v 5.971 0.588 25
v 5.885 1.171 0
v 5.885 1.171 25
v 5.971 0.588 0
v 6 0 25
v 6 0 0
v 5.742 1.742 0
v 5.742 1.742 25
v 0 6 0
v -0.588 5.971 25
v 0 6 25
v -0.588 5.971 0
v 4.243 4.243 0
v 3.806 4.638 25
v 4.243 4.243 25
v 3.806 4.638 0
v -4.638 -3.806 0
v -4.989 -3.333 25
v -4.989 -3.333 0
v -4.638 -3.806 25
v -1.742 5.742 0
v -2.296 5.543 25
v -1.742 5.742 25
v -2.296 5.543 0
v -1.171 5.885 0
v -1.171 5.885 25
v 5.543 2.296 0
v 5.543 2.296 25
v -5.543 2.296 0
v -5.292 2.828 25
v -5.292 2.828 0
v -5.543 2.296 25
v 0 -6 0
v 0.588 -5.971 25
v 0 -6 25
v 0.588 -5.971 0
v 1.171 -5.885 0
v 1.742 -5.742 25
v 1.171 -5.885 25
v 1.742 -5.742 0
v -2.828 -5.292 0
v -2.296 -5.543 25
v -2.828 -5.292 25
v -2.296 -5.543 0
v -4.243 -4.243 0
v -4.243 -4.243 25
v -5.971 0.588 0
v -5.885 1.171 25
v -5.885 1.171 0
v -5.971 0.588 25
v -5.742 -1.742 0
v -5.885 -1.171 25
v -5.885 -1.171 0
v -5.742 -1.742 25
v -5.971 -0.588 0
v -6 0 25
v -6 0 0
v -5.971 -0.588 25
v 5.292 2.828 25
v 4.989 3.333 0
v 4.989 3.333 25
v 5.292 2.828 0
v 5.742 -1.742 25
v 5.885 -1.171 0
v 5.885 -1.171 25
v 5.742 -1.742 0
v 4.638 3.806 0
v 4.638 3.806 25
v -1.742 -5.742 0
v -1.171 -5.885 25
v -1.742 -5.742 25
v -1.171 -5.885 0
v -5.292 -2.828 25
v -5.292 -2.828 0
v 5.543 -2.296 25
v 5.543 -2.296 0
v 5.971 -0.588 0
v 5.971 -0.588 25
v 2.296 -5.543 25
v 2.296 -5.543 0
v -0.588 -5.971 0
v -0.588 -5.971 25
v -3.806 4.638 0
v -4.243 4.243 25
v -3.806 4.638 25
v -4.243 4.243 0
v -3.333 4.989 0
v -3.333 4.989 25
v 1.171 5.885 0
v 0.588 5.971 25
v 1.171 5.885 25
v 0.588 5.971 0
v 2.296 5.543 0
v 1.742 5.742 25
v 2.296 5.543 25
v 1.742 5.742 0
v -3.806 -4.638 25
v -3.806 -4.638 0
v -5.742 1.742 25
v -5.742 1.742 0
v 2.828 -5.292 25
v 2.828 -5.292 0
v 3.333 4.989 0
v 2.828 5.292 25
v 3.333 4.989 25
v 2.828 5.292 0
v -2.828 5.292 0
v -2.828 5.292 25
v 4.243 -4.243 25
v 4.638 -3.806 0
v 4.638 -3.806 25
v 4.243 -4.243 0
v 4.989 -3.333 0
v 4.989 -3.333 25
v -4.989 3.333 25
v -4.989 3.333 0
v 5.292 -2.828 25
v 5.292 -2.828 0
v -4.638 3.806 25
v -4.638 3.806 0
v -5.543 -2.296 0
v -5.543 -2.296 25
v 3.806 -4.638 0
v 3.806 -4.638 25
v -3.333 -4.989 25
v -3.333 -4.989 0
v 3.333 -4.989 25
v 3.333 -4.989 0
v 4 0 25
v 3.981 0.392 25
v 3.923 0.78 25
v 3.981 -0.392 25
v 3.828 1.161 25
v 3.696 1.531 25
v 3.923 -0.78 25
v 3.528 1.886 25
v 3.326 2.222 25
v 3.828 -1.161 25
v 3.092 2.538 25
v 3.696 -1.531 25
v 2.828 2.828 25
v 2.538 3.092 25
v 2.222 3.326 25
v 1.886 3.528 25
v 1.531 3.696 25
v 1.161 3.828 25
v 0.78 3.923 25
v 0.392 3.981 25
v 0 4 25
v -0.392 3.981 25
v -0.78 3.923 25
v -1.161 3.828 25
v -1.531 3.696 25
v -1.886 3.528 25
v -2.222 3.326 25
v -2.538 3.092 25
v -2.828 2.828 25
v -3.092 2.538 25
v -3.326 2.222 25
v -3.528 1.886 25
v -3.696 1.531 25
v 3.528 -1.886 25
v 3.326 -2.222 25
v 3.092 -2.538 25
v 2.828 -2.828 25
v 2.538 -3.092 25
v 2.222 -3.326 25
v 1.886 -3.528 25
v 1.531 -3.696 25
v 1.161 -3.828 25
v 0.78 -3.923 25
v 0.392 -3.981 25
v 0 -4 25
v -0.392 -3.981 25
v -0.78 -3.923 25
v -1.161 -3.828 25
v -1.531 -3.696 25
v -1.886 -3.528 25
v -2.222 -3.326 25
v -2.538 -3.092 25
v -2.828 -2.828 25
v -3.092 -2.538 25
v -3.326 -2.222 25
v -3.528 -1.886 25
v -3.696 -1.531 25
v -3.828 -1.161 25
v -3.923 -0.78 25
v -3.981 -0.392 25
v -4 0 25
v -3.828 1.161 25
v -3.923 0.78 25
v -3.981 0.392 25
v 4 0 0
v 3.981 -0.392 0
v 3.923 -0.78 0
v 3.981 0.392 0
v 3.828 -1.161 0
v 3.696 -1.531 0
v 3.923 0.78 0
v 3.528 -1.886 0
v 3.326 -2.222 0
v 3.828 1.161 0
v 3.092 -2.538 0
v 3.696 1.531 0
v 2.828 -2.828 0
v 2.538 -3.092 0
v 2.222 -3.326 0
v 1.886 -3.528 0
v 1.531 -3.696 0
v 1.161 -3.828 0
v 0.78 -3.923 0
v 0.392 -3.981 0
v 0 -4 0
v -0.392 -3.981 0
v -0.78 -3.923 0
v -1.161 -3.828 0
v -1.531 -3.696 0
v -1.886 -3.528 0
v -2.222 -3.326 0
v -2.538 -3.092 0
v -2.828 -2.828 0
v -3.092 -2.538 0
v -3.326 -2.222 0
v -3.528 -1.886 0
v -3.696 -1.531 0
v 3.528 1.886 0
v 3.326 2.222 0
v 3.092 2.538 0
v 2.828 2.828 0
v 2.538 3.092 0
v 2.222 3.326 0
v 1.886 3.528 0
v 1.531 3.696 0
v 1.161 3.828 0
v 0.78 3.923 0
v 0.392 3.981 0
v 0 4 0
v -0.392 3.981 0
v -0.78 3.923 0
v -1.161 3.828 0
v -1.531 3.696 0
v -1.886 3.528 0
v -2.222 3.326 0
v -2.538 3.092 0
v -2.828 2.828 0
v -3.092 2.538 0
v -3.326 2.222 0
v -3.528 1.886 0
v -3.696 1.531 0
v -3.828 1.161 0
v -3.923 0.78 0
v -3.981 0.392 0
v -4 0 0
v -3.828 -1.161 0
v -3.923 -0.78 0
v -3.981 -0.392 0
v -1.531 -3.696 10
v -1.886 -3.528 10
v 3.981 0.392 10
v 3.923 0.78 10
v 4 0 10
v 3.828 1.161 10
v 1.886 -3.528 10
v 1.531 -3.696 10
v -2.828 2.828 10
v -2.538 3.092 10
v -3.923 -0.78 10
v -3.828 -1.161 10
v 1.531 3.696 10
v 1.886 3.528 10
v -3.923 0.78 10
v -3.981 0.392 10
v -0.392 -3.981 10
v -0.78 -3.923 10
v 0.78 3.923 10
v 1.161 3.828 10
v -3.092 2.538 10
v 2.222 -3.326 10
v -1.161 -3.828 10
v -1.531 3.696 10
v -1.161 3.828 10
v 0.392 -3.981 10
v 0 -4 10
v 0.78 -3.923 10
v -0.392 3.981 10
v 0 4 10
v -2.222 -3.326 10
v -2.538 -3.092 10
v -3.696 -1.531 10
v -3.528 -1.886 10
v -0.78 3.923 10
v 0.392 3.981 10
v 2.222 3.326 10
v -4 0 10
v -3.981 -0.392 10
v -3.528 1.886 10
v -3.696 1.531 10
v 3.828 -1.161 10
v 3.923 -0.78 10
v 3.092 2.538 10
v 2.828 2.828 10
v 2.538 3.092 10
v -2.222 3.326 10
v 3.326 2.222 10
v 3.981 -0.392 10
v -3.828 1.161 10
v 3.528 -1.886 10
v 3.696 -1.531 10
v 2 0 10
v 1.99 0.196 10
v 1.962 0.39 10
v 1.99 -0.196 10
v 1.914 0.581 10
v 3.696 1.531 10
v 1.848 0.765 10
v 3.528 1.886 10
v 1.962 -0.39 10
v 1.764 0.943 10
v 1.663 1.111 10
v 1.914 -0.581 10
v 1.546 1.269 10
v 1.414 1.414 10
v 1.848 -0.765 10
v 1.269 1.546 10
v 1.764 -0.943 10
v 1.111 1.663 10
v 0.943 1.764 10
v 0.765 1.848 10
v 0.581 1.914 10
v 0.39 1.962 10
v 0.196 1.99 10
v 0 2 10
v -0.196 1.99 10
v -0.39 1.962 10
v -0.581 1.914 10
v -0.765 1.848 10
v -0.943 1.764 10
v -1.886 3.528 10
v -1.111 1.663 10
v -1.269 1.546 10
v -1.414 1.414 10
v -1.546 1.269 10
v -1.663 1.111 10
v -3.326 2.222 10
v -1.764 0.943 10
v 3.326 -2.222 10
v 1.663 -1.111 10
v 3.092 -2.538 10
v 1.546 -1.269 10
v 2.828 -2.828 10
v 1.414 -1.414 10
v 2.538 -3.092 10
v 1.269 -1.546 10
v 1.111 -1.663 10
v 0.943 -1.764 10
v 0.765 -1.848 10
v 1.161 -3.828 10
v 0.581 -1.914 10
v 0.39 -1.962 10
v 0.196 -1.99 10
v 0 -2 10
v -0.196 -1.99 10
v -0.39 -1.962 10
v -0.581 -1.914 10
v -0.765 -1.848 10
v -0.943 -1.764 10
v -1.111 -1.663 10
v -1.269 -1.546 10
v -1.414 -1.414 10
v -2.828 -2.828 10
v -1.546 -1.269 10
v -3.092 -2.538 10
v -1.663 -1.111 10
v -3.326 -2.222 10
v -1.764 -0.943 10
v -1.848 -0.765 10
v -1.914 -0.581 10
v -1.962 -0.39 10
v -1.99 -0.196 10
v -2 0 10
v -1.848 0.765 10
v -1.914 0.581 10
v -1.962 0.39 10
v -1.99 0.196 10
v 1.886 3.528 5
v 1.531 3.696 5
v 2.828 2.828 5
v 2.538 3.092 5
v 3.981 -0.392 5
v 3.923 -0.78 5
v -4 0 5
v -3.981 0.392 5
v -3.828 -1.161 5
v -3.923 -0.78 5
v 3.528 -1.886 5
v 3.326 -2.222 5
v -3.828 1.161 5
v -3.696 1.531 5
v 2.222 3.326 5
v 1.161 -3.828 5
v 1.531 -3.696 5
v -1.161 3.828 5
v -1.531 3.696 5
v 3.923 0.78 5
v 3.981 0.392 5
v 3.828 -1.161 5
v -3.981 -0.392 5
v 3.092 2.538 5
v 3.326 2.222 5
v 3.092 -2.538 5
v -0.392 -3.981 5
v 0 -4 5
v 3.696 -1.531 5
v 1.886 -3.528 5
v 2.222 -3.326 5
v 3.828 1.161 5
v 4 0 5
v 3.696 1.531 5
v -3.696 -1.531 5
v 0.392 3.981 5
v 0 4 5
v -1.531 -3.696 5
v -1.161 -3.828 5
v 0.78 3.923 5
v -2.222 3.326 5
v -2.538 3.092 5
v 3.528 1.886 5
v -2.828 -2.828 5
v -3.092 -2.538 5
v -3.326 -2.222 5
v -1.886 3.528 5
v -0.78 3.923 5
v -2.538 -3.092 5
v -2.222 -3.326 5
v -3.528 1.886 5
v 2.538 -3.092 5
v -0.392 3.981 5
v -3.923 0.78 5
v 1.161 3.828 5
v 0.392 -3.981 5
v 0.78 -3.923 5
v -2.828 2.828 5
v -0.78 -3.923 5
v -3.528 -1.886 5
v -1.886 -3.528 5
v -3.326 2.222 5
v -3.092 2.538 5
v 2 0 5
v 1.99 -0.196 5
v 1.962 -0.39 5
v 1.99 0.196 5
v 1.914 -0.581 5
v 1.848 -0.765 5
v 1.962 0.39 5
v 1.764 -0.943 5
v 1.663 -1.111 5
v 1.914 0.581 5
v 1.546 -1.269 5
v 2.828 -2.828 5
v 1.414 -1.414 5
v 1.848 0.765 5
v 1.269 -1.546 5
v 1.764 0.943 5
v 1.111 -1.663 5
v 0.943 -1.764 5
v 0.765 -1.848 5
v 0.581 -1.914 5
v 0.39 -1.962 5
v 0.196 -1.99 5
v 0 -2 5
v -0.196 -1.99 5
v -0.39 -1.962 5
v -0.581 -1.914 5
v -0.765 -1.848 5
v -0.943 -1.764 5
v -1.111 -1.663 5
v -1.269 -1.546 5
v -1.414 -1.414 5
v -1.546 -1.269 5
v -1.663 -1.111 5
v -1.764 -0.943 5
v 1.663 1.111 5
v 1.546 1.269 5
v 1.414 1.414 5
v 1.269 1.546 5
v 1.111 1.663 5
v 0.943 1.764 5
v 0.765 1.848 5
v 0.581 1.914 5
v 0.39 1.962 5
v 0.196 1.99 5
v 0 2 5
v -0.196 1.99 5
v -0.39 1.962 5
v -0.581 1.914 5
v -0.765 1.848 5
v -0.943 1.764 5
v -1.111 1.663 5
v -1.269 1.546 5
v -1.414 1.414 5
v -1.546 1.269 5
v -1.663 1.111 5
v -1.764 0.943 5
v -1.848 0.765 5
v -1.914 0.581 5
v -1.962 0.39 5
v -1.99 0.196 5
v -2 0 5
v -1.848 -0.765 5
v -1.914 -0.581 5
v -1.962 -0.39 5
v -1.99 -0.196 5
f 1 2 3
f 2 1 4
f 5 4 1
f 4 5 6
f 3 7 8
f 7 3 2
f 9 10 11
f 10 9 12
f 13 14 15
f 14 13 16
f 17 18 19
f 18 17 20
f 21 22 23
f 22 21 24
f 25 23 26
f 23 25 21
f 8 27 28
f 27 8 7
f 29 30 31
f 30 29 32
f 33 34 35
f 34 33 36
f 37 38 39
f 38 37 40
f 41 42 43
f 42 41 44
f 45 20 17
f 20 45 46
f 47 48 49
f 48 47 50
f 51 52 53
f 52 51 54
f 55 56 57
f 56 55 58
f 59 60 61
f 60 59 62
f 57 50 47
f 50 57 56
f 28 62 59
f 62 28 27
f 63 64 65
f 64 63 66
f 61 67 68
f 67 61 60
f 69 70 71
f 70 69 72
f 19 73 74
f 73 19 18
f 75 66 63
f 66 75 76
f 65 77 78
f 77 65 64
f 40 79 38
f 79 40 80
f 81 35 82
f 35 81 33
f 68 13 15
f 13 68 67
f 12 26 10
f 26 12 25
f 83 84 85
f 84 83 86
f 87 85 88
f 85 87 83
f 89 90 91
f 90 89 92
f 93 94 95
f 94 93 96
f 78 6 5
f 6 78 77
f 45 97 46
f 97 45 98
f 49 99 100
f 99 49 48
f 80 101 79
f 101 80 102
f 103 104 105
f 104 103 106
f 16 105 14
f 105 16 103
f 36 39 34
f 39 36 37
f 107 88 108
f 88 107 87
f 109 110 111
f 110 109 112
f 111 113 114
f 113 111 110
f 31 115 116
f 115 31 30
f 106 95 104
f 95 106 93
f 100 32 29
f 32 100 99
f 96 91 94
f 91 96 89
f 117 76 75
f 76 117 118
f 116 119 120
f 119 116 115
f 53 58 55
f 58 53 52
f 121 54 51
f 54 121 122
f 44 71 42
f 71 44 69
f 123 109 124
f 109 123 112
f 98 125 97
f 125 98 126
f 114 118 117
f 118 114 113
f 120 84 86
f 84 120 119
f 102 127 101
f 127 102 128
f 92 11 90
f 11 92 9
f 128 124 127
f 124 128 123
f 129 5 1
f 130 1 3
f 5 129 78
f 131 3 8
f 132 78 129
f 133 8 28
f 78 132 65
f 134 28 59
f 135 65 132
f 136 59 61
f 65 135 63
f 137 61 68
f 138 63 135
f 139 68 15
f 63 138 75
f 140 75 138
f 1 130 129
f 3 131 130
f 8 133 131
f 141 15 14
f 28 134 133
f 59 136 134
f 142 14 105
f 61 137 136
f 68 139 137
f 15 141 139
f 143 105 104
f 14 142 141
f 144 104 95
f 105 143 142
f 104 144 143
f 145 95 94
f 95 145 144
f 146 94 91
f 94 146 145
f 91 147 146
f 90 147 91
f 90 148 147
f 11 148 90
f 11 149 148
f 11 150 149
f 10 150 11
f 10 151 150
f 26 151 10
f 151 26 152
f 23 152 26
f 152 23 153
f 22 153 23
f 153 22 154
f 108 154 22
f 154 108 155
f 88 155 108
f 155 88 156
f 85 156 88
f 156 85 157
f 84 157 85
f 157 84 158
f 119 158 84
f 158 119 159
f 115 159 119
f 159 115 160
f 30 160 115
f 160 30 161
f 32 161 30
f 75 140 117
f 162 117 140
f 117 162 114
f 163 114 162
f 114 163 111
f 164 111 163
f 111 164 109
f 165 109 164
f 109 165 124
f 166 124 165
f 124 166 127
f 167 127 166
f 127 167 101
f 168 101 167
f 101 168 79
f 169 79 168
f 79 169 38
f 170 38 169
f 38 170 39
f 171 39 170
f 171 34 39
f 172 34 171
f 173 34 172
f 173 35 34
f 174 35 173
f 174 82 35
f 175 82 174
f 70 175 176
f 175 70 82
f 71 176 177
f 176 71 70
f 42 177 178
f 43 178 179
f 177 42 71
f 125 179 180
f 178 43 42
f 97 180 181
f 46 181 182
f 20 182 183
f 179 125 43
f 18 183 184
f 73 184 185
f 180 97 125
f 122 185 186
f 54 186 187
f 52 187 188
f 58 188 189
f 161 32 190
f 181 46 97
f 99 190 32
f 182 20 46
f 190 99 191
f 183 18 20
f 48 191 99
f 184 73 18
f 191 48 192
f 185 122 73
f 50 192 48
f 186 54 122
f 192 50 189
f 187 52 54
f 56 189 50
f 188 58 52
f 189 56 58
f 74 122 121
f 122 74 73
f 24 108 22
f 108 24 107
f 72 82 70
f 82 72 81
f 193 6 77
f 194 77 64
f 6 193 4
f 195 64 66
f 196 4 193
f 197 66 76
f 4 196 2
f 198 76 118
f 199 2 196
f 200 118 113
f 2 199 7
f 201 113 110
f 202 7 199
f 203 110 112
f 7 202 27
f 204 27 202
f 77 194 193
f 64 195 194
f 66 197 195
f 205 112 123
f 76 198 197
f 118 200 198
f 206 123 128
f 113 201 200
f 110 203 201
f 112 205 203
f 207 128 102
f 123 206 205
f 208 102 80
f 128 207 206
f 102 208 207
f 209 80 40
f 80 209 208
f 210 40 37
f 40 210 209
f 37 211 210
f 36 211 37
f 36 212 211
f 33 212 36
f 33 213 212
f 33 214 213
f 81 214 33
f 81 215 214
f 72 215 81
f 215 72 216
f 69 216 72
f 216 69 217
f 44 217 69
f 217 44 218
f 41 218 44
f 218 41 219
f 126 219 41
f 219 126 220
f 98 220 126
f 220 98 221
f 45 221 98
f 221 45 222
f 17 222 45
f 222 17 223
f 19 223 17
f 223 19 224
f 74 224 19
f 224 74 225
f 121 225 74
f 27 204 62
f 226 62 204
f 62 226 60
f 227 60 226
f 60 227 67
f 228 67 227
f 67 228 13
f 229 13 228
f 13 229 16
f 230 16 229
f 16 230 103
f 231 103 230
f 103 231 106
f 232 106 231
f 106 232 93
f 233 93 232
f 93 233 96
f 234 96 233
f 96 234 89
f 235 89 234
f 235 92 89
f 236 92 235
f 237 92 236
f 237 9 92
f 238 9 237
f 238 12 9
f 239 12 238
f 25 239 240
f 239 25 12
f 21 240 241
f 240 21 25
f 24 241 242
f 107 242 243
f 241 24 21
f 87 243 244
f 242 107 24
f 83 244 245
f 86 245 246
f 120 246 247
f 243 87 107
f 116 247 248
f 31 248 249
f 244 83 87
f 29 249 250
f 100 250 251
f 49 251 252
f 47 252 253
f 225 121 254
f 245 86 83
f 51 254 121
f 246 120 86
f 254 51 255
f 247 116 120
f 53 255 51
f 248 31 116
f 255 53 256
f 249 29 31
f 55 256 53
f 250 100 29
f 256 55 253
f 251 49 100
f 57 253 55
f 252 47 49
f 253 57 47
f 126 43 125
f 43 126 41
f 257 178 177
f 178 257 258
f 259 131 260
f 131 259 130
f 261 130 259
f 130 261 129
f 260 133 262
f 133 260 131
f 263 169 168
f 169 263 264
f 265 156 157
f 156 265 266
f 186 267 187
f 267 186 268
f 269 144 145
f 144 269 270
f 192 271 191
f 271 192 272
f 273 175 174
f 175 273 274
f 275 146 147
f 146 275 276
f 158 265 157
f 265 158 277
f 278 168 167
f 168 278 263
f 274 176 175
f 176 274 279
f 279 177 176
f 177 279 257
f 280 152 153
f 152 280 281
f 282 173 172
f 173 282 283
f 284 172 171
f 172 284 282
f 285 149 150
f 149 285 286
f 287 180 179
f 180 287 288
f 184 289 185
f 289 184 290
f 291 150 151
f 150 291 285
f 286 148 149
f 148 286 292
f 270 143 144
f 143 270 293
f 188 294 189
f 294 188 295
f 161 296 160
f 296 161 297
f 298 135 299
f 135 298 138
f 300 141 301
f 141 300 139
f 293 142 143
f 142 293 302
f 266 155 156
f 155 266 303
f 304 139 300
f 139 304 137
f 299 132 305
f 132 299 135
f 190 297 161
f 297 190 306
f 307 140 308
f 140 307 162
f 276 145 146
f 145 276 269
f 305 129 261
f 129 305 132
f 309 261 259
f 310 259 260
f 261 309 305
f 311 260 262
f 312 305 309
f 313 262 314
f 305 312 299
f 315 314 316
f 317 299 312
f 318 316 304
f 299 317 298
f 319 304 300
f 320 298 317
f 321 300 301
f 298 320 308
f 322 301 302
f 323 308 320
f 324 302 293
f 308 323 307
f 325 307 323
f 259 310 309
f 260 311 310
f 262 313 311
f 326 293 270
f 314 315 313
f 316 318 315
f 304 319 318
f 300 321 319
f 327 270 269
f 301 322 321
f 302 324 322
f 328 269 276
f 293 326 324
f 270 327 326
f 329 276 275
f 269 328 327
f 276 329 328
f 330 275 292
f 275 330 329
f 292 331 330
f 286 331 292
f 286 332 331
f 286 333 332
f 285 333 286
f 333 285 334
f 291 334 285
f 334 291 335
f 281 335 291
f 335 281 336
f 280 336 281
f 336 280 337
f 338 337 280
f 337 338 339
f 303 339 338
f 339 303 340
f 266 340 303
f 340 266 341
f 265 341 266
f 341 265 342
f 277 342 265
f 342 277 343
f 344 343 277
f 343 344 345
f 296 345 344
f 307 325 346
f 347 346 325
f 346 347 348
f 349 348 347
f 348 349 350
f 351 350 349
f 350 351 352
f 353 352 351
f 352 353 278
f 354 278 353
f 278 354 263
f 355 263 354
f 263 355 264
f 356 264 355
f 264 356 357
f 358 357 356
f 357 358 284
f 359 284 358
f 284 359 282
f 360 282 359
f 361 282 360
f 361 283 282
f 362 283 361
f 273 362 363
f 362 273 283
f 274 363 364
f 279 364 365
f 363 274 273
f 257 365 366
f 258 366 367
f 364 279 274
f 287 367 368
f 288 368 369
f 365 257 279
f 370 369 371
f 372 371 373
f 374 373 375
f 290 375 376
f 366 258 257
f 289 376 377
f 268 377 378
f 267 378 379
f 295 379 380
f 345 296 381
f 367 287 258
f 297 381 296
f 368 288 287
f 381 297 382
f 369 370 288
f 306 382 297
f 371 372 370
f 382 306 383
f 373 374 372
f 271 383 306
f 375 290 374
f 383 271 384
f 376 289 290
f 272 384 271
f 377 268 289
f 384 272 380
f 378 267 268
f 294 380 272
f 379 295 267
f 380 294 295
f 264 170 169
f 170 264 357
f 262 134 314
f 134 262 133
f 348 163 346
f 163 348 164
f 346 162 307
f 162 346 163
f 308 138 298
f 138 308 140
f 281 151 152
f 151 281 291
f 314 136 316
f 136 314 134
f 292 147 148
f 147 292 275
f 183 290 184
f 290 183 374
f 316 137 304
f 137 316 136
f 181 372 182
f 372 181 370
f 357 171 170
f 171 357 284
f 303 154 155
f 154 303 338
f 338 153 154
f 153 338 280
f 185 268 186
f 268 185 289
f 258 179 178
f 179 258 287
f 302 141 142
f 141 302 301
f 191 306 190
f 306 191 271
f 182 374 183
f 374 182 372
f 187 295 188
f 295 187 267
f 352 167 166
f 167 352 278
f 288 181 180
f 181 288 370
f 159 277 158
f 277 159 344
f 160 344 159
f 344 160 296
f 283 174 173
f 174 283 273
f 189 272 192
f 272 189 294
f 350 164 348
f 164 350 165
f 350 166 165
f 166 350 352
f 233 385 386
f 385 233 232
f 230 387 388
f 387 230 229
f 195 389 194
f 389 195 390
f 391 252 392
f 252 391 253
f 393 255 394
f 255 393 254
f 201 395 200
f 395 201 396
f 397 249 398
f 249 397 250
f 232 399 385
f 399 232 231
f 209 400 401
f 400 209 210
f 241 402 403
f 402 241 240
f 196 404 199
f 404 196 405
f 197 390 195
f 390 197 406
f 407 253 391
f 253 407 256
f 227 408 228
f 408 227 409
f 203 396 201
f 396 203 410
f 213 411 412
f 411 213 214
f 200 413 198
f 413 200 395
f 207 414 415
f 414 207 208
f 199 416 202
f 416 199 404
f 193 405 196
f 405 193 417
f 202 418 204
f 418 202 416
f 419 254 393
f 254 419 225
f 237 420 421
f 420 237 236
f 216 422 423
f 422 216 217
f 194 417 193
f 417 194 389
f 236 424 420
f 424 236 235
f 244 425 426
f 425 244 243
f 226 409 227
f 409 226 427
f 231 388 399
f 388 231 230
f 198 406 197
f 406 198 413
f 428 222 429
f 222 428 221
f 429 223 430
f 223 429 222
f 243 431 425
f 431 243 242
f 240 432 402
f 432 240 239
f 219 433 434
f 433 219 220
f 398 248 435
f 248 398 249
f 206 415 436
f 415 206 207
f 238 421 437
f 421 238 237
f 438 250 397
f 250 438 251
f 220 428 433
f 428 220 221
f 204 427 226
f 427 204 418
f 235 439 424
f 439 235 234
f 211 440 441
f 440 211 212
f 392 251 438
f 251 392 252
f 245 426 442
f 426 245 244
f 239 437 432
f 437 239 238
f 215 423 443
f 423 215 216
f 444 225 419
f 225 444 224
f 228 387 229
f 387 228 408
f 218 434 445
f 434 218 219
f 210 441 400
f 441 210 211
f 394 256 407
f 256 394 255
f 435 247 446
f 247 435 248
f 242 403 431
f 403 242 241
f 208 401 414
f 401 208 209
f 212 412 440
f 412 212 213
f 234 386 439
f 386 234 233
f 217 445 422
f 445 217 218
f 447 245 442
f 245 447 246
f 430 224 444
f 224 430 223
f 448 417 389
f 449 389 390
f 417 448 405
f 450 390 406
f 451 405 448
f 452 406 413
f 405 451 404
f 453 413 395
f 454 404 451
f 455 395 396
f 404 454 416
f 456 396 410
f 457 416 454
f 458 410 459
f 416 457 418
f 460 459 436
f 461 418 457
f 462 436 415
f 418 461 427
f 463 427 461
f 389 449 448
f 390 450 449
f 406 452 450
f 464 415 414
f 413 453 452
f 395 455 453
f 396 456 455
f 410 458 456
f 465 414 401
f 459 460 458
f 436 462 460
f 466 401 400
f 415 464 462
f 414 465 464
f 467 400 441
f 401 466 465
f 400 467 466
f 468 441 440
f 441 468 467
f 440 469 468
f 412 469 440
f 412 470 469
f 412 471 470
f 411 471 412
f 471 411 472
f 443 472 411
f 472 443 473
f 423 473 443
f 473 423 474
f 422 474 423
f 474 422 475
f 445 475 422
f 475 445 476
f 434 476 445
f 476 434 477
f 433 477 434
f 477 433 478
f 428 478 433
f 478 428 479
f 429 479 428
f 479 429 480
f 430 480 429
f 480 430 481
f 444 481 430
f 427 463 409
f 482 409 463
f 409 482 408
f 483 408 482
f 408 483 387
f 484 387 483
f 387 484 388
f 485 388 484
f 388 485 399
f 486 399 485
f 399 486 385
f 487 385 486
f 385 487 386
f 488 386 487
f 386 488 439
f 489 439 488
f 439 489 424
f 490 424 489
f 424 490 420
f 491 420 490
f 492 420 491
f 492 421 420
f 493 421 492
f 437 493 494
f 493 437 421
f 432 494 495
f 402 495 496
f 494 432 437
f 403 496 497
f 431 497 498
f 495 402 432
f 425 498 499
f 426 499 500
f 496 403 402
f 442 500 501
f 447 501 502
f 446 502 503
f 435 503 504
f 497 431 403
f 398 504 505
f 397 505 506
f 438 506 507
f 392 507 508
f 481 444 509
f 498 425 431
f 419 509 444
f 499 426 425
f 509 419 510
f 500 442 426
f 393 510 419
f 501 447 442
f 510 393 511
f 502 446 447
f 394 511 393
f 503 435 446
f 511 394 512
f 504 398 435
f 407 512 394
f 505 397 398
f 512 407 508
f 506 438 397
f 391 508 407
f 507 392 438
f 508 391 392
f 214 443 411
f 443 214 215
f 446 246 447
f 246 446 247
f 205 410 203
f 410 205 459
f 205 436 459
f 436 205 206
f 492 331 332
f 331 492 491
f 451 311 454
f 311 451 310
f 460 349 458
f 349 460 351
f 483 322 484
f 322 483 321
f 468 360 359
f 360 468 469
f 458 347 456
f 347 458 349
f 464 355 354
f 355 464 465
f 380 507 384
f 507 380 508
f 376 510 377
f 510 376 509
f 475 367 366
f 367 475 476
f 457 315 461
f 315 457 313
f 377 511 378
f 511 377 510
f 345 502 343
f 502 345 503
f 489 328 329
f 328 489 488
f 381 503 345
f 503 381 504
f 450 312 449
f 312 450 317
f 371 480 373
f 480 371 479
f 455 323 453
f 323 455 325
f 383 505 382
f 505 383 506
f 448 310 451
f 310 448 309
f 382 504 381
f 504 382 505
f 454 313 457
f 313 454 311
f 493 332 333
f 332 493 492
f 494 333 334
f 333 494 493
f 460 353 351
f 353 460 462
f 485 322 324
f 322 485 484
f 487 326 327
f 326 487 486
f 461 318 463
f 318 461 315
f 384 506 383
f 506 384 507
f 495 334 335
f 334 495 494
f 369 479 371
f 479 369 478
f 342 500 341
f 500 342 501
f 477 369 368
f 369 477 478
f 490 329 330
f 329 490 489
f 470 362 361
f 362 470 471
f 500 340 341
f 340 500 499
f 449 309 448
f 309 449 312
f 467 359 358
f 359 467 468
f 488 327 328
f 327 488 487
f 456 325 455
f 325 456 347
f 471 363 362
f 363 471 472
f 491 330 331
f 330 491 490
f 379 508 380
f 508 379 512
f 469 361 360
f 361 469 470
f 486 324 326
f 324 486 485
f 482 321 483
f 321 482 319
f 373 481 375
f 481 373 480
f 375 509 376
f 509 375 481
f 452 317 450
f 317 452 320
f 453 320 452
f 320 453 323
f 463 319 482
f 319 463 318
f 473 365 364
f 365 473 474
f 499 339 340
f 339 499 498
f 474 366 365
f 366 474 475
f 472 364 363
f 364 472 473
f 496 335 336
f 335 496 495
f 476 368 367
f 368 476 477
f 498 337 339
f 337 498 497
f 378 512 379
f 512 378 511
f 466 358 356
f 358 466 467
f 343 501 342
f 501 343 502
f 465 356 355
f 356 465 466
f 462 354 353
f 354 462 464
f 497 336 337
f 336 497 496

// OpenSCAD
// =====================================
// Sink Tray Foot
// Cylindrical foot attached to tray by a screw
// =====================================

$fn = 64;

// ---- Parameters (mm) ----
total_height = 25;

r0 = 2;     // screw shaft hole radius
r1 = 4;     // counterbore radius (screw head clearance)
r2 = 6;     // outer radius

top_bore = 15;    // counterbore depth from top
bottom_bore = 5;  // counterbore depth from bottom
// middle section = total_height - top_bore - bottom_bore = 5mm (solid ring at r0)

// ---- Assembly ----
difference() {
    // Solid cylinder
    cylinder(r = r2, h = total_height);

    // Counterbore from top (for screw head)
    translate([0, 0, total_height - top_bore])
        cylinder(r = r1, h = top_bore + 0.1);

    // Counterbore from bottom
    translate([0, 0, -0.1])
        cylinder(r = r1, h = bottom_bore + 0.1);

    // Narrow screw shaft hole through the middle section
    translate([0, 0, bottom_bore])
        cylinder(r = r0, h = total_height - top_bore - bottom_bore);
}
